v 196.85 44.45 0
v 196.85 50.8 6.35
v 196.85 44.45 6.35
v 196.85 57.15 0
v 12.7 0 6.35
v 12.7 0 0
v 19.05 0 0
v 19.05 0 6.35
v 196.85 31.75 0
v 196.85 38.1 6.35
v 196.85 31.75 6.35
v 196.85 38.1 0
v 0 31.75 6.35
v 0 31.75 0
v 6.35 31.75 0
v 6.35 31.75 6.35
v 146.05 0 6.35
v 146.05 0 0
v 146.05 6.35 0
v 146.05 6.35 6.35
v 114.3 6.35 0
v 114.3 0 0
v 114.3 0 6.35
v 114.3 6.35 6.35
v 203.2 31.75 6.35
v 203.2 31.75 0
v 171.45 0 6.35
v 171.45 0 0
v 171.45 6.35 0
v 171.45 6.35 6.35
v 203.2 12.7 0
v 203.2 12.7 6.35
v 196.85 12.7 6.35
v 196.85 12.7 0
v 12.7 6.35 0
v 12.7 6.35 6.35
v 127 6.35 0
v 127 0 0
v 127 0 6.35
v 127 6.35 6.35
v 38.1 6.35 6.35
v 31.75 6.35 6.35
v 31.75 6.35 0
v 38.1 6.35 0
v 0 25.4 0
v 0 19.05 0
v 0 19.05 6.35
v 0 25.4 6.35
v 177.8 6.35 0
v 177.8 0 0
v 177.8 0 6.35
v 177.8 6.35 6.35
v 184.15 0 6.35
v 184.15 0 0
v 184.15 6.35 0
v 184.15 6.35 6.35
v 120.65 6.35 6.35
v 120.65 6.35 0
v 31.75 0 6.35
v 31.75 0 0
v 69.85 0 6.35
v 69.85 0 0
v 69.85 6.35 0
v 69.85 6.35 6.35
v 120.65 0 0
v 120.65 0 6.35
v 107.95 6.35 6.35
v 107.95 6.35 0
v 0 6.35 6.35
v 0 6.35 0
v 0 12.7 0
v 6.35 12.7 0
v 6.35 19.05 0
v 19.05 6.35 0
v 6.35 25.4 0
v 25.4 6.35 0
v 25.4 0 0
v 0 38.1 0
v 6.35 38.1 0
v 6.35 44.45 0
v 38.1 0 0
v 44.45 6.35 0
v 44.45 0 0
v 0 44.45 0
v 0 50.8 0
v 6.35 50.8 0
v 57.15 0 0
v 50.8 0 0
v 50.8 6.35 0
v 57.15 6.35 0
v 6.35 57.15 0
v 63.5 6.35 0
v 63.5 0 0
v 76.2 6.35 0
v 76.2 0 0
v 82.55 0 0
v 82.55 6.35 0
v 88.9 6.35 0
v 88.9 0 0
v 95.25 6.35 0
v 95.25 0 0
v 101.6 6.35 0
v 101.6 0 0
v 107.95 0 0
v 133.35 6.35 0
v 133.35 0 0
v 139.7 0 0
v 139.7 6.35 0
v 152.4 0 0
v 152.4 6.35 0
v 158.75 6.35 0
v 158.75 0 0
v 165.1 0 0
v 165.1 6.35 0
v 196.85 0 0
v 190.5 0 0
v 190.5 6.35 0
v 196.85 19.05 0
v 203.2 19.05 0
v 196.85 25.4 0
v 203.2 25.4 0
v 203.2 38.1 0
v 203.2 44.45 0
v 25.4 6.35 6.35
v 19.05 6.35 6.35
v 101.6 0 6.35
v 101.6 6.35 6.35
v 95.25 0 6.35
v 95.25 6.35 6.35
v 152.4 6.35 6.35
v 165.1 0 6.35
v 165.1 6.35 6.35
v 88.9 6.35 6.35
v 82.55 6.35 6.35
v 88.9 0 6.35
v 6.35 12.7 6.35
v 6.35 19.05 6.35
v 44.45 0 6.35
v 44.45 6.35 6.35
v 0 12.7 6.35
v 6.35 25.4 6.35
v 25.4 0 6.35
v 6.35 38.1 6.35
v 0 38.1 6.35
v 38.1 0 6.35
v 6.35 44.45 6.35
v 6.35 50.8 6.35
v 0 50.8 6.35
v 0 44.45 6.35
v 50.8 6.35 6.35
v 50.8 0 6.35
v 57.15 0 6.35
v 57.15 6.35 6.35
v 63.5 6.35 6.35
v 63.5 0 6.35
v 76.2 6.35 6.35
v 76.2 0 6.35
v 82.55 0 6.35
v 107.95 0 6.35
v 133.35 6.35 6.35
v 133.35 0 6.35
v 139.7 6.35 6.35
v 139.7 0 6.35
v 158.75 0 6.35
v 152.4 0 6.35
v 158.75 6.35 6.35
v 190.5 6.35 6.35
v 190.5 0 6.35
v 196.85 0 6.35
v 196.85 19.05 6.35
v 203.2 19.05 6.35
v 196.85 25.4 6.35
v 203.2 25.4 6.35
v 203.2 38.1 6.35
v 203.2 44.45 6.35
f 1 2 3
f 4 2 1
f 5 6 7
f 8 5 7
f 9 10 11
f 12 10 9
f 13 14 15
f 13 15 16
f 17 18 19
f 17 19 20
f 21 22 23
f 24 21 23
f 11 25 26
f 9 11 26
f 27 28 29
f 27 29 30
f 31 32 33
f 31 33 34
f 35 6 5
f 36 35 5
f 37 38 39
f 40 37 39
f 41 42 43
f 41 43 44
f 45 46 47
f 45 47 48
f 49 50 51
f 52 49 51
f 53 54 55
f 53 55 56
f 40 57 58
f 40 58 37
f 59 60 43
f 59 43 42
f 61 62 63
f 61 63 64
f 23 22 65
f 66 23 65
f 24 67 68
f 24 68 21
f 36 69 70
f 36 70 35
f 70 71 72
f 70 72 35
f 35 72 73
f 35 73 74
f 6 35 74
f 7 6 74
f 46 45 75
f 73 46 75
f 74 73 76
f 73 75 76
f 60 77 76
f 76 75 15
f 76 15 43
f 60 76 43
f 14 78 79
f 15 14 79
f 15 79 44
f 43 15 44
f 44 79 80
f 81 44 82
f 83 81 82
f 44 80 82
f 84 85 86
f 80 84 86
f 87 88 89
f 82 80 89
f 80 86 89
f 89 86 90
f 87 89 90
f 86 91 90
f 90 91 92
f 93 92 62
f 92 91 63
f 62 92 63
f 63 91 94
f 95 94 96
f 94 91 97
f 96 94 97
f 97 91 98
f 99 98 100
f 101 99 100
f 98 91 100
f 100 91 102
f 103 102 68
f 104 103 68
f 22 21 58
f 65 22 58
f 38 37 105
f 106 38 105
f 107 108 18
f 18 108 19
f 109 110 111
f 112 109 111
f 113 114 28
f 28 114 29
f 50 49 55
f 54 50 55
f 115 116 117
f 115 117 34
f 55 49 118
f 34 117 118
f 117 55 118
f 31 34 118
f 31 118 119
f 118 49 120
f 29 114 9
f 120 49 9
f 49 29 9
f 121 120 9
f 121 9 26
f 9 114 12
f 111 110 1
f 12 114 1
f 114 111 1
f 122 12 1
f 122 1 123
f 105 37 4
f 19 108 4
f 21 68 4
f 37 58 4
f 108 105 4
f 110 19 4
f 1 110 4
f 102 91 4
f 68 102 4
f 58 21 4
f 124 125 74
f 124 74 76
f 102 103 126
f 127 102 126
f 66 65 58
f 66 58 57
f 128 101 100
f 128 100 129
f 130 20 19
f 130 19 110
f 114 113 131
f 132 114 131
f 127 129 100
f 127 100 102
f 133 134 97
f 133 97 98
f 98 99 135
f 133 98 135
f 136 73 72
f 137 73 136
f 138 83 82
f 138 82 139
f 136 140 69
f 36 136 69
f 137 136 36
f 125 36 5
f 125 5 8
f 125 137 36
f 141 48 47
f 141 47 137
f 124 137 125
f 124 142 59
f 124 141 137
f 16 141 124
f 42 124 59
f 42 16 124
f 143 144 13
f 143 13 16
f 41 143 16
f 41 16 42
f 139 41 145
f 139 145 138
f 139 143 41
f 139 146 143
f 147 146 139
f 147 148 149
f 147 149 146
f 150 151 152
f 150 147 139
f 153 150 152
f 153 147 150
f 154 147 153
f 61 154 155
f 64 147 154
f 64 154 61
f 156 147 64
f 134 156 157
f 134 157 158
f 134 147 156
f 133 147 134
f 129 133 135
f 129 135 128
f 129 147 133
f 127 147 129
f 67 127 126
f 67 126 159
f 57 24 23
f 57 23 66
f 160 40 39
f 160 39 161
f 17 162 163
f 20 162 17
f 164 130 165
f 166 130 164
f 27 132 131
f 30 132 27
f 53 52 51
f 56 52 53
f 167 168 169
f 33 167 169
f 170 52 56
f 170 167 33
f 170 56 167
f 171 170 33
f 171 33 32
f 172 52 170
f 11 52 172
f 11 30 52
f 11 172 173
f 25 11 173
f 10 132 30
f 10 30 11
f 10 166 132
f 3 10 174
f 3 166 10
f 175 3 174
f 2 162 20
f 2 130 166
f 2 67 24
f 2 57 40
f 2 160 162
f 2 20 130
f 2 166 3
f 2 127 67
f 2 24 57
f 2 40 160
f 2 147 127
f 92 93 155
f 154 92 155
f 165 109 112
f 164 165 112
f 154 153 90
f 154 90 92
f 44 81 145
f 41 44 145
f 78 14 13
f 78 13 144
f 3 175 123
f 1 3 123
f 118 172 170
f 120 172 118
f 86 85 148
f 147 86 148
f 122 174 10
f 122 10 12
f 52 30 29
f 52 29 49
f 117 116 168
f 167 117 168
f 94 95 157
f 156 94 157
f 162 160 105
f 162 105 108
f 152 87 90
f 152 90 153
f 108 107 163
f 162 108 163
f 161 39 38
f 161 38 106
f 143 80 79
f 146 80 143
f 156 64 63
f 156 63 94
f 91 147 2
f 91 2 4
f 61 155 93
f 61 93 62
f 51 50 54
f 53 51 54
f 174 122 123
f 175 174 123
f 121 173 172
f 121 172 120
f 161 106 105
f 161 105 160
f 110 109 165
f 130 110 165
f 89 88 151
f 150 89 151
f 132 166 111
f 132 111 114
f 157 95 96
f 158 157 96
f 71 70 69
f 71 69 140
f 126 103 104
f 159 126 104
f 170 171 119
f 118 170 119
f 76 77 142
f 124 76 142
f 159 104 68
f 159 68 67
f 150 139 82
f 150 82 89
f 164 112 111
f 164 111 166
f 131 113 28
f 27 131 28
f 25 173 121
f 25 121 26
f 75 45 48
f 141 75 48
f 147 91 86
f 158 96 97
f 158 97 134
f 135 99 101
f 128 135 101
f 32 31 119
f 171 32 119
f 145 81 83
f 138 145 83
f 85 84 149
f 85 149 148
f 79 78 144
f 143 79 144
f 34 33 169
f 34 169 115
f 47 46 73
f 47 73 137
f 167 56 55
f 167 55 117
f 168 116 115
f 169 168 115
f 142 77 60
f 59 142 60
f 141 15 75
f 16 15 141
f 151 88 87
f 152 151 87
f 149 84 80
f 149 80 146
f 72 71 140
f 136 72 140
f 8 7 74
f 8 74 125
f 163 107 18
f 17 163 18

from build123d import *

# Parameters (mm, degrees)
SKETCH2_W           = 203.2
SKETCH2_H           = 57.15
BOSS_EXTRUDE1_DEPTH = 6.35
SKETCH3_W           = 12.7
SKETCH3_H           = 6.35
CUT_EXTRUDE1_DEPTH  = 6.35
SKETCH5_W           = 6.35
SKETCH5_H           = 6.35
CUT_EXTRUDE2_DEPTH  = 6.35
LPATTERN1_COUNT     = 15
LPATTERN1_PITCH     = 12.7
SKETCH6_W           = 6.35
SKETCH6_H           = 6.35
CUT_EXTRUDE3_DEPTH  = 6.35
SKETCH7_W           = 6.35
SKETCH7_H           = 6.35
CUT_EXTRUDE4_DEPTH  = 6.35
LPATTERN2_COUNT     = 4
LPATTERN2_PITCH     = 12.7
SKETCH8_W           = 6.35
SKETCH8_H           = 6.35
CUT_EXTRUDE5_DEPTH  = 6.35
SKETCH9_W           = 6.35
SKETCH9_H           = 6.35
CUT_EXTRUDE6_DEPTH  = 6.35
LPATTERN3_COUNT     = 4
LPATTERN3_PITCH     = 12.7
CUT_EXTRUDE7_DEPTH  = 190.5


with BuildPart() as part:
    # Sketch2 → Boss-Extrude1 (new body)
    with BuildSketch(Plane.XY):
        with Locations((101.6, 28.575)):
            Rectangle(SKETCH2_W, SKETCH2_H)
    extrude(amount=BOSS_EXTRUDE1_DEPTH)

    # Sketch3 → Cut-Extrude1 (cut)
    with BuildSketch(Plane.XZ):
        with Locations((6.35, 3.175)):
            Rectangle(SKETCH3_W, SKETCH3_H)
    extrude(amount=-CUT_EXTRUDE1_DEPTH, mode=Mode.SUBTRACT)

    # Sketch5 → Cut-Extrude2 (cut)
    with BuildSketch(Plane.XZ):
        with Locations((22.225, 3.175)):
            Rectangle(SKETCH5_W, SKETCH5_H)
    cut_extrude2 = extrude(amount=-CUT_EXTRUDE2_DEPTH, mode=Mode.SUBTRACT)

    # LPattern1: Cut-Extrude2 ×15
    with Locations(*[(i * LPATTERN1_PITCH, 0, 0) for i in range(1, LPATTERN1_COUNT)]):
        add(cut_extrude2, mode=Mode.SUBTRACT)

    # Sketch6 → Cut-Extrude3 (cut)
    with BuildSketch(Plane(origin=(203.2, 0, 0), x_dir=(0, 0, -1), z_dir=(1, 0, 0))):
        with Locations((-3.175, 9.525)):
            Rectangle(SKETCH6_W, SKETCH6_H)
    extrude(amount=-CUT_EXTRUDE3_DEPTH, mode=Mode.SUBTRACT)

    # Sketch7 → Cut-Extrude4 (cut)
    with BuildSketch(Plane(origin=(203.2, 0, 0), x_dir=(0, 0, -1), z_dir=(1, 0, 0))):
        with Locations((-3.175, 22.225)):
            Rectangle(SKETCH7_W, SKETCH7_H)
    cut_extrude4 = extrude(amount=-CUT_EXTRUDE4_DEPTH, mode=Mode.SUBTRACT)

    # LPattern2: Cut-Extrude4 ×4
    with Locations(*[(0, i * LPATTERN2_PITCH, 0) for i in range(1, LPATTERN2_COUNT)]):
        add(cut_extrude4, mode=Mode.SUBTRACT)

    # Sketch8 → Cut-Extrude5 (cut)
    with BuildSketch(Plane(origin=(203.2, 0, 0), x_dir=(0, 0, -1), z_dir=(1, 0, 0))):
        with Locations((-3.175, 53.975)):
            Rectangle(SKETCH8_W, SKETCH8_H)
    extrude(amount=-CUT_EXTRUDE5_DEPTH, mode=Mode.SUBTRACT)

    # Sketch9 → Cut-Extrude6 (cut)
    with BuildSketch(Plane.ZY):
        with Locations((3.175, 15.875)):
            Rectangle(SKETCH9_W, SKETCH9_H)
    cut_extrude6 = extrude(amount=-CUT_EXTRUDE6_DEPTH, mode=Mode.SUBTRACT)

    # LPattern3: Cut-Extrude6 ×4
    with Locations(*[(0, i * LPATTERN3_PITCH, 0) for i in range(1, LPATTERN3_COUNT)]):
        add(cut_extrude6, mode=Mode.SUBTRACT)

    # Sketch10 → Cut-Extrude7 (cut)
    with BuildSketch(Plane.ZY.offset(-6.35)):
        Polygon((6.35, 57.15), (6.35, 50.8), (0, 57.15), align=None)
    extrude(amount=-CUT_EXTRUDE7_DEPTH, mode=Mode.SUBTRACT)


solid = part.part
